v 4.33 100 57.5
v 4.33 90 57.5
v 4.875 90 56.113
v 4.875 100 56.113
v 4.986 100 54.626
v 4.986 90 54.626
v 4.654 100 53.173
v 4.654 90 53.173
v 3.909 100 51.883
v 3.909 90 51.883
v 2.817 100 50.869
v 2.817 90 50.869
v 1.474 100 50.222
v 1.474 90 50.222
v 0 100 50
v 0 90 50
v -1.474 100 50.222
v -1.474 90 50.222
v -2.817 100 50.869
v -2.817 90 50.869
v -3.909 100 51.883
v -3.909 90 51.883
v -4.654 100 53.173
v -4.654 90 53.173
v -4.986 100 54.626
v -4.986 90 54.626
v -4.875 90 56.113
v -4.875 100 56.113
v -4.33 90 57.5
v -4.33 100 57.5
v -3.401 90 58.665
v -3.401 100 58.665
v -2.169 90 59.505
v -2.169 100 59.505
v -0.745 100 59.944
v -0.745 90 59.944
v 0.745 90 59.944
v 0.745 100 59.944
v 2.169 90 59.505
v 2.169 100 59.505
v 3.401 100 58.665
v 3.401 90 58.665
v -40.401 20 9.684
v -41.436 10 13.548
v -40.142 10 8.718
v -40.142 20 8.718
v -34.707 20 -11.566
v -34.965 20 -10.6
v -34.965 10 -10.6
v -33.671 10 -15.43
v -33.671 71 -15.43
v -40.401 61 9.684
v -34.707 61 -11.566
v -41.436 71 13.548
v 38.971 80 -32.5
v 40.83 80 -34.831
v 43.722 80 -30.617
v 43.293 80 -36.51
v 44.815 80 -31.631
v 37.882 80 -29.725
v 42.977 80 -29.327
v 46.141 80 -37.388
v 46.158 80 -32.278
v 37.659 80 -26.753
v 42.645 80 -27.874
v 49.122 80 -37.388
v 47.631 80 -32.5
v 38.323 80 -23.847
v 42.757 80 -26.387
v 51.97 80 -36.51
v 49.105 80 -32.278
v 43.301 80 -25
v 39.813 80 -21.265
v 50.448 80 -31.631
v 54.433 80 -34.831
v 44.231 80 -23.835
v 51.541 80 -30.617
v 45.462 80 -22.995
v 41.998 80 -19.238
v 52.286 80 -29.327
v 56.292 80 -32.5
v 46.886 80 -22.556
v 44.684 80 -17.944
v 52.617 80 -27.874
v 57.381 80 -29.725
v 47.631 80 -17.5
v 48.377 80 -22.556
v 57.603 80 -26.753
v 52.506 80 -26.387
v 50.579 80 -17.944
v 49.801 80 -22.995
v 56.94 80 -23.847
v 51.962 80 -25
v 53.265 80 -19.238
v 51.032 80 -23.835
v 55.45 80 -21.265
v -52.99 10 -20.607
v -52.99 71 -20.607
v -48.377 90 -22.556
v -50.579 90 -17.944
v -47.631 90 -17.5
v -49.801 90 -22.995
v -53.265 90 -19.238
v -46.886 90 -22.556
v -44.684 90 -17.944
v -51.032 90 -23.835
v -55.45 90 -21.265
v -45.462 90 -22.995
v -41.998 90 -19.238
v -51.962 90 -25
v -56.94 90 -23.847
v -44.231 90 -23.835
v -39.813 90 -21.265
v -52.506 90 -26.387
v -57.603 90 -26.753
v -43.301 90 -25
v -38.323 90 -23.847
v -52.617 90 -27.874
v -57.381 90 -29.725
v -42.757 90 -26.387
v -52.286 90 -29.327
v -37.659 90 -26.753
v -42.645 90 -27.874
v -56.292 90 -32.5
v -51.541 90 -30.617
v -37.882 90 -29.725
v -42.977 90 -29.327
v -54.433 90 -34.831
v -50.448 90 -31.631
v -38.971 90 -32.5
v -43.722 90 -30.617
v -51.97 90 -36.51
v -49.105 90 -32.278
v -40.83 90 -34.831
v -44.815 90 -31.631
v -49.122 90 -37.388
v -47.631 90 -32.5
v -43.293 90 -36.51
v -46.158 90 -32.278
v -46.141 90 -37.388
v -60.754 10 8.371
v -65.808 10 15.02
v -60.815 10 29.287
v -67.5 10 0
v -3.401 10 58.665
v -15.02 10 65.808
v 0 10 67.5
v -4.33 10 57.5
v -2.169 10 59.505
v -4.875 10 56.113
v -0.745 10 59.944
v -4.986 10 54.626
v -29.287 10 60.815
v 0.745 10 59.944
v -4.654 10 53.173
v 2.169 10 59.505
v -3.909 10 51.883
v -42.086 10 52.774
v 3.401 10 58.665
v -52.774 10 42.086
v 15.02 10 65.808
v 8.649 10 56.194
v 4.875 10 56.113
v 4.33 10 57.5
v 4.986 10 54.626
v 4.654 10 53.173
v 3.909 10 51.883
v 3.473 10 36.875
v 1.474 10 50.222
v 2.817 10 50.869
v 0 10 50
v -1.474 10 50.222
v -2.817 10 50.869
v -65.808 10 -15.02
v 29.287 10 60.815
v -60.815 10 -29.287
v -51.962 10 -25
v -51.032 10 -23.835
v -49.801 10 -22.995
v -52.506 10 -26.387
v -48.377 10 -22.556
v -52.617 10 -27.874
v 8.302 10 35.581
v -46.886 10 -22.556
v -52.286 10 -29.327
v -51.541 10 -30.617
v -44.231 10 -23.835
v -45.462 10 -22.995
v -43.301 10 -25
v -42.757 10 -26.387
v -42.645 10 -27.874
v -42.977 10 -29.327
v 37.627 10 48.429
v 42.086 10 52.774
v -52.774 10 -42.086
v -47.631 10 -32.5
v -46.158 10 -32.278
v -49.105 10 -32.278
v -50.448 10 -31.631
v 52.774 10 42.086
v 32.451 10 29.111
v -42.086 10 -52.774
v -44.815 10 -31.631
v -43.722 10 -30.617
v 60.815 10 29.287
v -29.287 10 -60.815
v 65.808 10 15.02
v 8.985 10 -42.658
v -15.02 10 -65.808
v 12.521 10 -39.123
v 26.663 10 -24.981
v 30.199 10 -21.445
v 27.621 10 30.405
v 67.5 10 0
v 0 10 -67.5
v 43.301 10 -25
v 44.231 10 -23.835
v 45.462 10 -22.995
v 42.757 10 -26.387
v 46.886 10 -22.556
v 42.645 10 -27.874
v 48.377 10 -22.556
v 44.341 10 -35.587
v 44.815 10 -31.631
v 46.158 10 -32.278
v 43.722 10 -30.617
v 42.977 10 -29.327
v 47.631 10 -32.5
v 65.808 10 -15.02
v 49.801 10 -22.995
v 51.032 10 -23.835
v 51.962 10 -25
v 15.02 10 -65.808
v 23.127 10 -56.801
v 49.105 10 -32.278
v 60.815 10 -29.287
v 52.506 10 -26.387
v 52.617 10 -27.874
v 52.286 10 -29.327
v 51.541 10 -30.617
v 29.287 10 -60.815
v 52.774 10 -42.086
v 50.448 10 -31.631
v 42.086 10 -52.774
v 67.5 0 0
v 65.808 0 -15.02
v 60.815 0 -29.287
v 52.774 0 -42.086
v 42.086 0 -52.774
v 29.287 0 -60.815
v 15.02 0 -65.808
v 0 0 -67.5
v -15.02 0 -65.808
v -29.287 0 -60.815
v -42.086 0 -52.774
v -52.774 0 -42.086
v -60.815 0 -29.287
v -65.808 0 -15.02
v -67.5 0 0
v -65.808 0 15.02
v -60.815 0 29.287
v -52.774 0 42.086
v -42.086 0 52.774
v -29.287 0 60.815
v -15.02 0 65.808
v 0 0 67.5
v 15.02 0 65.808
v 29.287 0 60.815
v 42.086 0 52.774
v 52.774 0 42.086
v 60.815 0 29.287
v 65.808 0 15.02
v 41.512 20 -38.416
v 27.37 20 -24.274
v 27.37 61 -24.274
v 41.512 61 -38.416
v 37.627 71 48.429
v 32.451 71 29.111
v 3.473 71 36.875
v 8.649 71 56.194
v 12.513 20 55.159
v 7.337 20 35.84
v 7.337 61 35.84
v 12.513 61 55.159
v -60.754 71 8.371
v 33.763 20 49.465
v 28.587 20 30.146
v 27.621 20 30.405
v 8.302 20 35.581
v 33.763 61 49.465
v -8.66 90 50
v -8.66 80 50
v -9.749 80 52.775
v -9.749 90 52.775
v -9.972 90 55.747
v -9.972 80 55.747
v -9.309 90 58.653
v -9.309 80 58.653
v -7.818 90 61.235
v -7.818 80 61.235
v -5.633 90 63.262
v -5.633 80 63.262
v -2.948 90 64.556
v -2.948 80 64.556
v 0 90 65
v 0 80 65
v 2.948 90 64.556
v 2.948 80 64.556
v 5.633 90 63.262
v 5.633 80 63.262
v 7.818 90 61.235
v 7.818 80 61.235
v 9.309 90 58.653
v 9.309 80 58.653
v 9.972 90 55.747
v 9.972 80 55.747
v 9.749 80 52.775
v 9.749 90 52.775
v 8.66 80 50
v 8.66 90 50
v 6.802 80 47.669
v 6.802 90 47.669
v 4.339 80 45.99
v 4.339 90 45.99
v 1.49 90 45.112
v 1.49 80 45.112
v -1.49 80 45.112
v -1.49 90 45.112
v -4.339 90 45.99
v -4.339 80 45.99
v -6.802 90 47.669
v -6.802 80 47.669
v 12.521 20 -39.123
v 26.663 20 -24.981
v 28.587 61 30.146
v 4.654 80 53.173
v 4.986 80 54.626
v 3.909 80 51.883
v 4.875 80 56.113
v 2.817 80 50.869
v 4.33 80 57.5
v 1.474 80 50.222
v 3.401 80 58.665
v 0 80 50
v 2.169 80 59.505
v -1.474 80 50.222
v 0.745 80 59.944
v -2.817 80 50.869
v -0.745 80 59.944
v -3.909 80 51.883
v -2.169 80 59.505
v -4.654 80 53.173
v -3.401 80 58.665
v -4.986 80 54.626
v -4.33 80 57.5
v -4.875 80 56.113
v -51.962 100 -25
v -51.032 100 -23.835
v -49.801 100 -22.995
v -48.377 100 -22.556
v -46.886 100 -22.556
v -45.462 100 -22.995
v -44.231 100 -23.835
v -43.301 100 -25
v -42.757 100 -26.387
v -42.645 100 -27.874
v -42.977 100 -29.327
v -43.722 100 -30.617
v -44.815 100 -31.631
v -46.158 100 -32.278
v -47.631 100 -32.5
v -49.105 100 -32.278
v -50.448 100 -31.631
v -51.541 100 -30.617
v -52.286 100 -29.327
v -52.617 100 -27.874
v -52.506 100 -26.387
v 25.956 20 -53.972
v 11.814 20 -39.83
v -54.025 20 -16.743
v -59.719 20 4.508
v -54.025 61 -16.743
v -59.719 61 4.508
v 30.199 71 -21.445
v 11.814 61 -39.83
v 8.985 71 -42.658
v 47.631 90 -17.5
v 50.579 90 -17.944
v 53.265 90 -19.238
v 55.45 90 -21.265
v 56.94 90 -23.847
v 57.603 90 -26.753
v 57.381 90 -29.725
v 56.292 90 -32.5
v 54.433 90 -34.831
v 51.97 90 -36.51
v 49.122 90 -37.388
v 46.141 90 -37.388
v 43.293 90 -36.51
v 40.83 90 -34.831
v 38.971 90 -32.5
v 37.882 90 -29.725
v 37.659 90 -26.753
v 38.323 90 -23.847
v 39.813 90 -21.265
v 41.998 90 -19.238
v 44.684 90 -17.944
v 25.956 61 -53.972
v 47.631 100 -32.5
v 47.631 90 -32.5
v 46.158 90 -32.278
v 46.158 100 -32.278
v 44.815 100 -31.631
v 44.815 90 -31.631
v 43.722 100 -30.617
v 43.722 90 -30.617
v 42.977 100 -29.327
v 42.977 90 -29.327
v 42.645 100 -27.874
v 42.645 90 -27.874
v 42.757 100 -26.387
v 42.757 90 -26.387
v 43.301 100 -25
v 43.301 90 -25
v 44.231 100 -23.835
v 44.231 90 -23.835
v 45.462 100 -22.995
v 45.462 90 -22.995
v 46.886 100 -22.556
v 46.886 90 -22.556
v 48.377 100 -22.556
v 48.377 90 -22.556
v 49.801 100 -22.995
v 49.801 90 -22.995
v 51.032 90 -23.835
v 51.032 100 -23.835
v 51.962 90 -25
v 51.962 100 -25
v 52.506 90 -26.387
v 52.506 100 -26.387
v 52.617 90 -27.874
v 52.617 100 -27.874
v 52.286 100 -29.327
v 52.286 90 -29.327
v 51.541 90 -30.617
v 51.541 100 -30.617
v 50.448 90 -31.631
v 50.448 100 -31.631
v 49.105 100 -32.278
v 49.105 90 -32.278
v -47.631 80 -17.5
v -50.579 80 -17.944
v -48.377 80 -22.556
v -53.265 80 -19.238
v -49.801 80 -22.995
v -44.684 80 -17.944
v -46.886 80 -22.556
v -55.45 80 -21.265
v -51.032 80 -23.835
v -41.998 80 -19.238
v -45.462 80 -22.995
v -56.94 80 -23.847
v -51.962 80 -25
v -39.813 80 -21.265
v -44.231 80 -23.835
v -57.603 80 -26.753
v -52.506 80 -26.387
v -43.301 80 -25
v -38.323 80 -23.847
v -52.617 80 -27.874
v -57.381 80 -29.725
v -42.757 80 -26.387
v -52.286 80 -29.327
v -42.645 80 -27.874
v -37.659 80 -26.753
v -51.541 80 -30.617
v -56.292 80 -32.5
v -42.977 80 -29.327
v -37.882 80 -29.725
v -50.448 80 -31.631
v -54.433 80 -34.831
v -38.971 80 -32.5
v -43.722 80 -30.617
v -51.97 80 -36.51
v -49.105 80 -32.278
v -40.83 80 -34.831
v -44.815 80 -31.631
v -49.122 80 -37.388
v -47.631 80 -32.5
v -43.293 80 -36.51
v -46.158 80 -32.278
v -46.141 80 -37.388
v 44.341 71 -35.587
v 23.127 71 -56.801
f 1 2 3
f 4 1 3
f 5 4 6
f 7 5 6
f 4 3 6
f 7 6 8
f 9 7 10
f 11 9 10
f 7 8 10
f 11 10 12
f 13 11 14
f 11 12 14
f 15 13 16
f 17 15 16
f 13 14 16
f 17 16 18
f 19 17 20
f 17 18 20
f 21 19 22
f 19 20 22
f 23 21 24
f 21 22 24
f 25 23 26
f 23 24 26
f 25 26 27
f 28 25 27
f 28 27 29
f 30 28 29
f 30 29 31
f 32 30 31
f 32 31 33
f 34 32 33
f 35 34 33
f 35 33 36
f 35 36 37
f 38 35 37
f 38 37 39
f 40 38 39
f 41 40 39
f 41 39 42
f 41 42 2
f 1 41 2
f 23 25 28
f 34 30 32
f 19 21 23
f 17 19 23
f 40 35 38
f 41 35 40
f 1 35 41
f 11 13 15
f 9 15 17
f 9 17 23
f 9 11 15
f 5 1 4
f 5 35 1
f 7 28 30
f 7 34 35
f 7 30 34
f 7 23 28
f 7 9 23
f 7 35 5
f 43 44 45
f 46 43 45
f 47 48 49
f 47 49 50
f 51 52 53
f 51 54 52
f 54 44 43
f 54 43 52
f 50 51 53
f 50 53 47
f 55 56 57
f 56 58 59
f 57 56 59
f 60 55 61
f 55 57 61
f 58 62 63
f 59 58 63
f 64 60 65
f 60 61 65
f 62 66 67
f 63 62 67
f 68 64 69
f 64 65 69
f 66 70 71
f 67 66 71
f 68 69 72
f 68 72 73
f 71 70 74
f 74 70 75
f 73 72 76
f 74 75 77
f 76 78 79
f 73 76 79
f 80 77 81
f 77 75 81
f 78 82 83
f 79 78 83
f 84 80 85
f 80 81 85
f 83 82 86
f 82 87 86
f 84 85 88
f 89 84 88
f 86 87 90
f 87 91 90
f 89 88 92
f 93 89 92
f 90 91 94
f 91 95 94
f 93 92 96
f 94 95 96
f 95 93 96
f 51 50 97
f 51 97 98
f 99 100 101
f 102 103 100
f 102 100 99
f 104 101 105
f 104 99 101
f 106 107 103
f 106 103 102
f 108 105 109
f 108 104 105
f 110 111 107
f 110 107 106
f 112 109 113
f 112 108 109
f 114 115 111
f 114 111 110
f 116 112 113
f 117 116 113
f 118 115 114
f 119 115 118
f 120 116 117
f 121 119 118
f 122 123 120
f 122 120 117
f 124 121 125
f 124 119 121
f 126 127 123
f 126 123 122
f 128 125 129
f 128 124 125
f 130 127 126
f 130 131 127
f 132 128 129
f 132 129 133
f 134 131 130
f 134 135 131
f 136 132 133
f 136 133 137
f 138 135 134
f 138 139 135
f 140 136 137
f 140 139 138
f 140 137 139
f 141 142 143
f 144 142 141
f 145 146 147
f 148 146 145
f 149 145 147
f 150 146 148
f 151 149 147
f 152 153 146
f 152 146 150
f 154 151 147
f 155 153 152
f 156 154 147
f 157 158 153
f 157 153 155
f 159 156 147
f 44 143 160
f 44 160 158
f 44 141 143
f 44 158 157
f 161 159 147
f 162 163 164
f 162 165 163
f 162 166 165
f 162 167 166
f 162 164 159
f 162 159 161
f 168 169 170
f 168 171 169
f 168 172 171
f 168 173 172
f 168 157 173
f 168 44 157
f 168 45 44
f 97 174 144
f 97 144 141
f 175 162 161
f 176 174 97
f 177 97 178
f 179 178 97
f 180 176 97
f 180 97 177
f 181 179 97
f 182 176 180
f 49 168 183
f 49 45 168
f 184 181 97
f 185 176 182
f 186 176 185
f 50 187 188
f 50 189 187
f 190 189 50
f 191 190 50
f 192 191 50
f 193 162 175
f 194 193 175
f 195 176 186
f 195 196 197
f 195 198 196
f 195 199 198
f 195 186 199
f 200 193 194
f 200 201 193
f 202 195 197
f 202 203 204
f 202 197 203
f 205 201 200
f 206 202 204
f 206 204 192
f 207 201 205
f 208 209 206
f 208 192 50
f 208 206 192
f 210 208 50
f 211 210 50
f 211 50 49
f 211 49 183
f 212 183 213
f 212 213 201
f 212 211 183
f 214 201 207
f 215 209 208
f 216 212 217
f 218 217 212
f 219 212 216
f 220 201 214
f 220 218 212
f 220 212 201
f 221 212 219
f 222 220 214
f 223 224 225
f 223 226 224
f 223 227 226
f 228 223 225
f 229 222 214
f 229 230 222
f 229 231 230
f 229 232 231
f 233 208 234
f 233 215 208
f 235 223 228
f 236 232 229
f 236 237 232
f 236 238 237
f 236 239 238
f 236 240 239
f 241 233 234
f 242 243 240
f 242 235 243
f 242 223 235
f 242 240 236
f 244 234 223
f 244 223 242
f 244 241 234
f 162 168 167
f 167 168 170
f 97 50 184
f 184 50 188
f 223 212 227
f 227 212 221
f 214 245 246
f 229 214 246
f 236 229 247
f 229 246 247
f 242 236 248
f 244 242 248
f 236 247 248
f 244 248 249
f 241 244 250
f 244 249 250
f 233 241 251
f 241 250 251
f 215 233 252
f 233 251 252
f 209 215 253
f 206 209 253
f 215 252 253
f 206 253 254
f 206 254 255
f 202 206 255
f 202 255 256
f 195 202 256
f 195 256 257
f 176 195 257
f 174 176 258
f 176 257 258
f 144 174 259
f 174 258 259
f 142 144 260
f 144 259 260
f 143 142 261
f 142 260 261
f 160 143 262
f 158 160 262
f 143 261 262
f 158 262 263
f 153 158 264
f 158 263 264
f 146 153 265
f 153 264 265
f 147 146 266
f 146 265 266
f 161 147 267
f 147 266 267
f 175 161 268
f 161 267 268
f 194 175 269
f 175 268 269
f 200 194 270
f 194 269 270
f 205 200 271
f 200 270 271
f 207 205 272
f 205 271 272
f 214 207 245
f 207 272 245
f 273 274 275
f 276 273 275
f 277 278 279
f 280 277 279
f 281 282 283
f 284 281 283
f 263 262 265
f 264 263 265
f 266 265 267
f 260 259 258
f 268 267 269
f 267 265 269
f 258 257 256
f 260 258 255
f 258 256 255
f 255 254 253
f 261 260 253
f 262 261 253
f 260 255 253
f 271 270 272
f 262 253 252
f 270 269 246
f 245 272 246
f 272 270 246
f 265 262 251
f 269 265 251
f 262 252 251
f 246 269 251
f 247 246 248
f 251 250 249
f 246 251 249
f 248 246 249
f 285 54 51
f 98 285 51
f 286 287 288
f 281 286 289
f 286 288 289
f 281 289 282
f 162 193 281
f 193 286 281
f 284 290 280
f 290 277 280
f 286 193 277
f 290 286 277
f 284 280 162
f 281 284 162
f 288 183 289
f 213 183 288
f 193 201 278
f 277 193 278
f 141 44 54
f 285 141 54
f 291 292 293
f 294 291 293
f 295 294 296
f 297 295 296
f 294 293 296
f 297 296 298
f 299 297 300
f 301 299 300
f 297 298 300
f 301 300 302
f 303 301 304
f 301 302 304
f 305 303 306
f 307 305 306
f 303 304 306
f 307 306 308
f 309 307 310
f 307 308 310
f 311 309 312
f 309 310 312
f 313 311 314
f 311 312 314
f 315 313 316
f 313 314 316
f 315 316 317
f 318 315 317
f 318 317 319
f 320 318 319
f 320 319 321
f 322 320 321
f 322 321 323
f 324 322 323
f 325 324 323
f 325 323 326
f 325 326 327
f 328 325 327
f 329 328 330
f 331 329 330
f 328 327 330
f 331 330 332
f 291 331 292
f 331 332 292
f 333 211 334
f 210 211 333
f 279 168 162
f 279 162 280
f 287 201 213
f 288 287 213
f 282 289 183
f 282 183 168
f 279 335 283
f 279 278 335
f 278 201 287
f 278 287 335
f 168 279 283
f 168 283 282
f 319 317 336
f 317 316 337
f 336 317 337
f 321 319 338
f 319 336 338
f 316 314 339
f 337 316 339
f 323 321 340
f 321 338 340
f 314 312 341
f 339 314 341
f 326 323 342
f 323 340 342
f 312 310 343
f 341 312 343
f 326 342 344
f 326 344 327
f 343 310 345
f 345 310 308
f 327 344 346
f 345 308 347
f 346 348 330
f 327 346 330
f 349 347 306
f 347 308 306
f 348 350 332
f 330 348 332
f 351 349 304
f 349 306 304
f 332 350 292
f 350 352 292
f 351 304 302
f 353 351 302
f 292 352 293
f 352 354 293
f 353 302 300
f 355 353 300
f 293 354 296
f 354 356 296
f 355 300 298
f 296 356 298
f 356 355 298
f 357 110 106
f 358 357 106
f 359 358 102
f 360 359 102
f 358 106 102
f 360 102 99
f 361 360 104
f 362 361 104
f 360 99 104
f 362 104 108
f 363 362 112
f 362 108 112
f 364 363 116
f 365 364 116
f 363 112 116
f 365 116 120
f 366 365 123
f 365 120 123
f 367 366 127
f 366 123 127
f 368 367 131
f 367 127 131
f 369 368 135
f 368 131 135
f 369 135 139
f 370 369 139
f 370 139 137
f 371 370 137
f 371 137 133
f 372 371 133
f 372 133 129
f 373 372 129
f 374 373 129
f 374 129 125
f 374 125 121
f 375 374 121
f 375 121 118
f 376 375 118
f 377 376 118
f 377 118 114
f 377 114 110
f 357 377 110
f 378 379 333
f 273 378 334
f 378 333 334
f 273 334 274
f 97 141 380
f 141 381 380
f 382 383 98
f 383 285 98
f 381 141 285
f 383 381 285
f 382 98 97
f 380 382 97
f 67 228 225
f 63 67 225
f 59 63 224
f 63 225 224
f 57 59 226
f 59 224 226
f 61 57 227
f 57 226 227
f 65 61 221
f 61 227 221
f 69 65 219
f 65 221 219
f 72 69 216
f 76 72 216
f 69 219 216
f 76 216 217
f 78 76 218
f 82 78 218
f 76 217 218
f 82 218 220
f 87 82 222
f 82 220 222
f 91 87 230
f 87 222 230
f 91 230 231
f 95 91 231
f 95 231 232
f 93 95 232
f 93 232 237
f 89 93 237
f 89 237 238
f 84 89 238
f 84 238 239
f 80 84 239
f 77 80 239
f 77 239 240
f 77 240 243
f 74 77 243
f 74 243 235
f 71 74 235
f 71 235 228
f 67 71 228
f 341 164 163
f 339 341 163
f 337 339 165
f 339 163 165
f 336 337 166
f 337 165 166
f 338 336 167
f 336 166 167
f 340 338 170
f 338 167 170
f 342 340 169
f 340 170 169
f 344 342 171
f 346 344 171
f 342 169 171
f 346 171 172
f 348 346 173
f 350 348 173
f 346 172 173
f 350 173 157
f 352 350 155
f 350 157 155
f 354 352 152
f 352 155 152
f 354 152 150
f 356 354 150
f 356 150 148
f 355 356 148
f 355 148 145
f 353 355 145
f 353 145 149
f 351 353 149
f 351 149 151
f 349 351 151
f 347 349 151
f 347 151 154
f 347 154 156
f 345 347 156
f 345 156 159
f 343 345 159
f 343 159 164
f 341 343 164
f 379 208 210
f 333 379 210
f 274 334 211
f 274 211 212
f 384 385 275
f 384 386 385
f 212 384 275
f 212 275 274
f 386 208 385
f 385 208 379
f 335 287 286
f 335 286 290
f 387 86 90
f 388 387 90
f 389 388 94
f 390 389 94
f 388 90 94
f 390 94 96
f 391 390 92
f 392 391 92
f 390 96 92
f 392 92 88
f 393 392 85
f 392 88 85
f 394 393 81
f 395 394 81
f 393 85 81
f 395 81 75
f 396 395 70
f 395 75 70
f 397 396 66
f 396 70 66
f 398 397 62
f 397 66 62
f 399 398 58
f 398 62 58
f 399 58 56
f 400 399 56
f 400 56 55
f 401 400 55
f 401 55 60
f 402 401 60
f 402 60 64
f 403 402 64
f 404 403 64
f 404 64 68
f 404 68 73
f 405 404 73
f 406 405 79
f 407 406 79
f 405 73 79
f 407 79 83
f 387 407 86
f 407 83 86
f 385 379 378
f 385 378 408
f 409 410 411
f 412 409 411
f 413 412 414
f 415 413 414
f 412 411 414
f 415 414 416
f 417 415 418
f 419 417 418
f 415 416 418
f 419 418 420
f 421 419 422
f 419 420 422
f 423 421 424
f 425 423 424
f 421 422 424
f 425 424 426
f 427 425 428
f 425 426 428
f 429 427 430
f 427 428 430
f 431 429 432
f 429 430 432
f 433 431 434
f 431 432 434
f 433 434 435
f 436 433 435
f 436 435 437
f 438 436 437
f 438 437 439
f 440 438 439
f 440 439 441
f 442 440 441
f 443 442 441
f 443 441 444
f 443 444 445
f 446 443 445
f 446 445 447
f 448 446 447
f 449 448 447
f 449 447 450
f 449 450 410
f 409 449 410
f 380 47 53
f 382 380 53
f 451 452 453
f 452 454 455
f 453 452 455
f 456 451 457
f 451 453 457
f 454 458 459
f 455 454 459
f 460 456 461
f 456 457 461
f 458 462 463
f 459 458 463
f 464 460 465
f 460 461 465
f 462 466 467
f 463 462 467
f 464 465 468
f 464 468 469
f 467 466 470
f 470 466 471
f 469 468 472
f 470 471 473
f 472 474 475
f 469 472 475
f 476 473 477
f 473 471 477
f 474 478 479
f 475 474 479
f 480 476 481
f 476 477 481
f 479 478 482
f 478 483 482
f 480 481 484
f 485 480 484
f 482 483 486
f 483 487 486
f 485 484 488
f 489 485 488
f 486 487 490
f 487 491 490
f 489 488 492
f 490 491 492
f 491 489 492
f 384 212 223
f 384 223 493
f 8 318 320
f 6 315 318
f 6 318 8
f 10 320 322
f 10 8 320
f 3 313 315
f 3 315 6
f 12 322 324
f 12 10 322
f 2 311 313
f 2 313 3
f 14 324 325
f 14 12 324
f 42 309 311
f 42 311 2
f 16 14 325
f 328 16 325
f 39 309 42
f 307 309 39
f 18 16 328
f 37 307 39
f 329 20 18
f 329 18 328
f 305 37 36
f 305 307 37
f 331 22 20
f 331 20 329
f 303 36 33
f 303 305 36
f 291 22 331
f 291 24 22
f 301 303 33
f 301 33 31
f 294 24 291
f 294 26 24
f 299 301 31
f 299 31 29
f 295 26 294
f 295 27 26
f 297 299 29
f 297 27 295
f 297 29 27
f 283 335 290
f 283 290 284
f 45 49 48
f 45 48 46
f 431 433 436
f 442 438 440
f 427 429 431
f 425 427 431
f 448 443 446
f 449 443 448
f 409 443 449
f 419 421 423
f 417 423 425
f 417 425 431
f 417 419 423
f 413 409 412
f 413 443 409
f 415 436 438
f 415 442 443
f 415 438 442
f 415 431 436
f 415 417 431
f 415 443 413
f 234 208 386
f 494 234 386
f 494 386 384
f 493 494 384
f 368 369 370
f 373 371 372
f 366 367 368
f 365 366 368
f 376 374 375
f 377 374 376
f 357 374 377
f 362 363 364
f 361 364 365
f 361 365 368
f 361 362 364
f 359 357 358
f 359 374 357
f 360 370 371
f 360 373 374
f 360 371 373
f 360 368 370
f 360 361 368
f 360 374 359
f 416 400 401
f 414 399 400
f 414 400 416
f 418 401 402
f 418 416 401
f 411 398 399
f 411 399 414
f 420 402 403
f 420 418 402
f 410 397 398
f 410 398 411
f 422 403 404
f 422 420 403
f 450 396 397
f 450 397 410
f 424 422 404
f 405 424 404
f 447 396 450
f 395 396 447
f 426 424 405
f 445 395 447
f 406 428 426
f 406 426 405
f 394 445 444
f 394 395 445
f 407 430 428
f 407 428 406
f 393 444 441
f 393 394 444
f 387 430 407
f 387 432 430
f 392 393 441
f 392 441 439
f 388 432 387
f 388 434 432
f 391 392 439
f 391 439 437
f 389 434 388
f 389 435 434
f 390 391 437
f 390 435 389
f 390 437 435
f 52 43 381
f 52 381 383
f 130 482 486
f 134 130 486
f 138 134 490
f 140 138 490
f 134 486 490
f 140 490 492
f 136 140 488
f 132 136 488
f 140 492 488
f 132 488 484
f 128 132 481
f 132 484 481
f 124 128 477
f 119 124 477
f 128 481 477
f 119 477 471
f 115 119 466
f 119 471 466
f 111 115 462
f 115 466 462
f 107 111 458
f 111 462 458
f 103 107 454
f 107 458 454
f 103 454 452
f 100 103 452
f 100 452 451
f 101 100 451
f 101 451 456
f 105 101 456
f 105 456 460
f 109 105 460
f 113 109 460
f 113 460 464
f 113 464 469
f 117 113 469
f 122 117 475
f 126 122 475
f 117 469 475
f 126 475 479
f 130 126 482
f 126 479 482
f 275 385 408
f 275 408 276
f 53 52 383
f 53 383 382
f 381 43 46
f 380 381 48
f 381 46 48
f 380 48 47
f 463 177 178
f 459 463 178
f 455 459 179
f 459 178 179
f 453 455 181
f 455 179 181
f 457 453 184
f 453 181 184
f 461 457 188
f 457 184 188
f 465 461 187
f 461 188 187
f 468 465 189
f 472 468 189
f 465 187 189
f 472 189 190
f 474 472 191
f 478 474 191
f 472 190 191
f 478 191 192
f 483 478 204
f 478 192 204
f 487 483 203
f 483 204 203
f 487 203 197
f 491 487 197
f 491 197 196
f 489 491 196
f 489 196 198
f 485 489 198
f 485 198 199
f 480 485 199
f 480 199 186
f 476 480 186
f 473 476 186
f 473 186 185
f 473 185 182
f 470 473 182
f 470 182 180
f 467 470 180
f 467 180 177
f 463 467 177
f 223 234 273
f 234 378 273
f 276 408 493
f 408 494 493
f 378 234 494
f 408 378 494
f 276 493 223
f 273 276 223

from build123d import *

# Parameters (mm, degrees)
BOSS_EXTRUDE1_OUTLINE_R = 67.5
BOSS_EXTRUDE1_DEPTH     = 10
SKETCH4_R               = 5
BOSS_EXTRUDE2_DEPTH     = 90
BOSS_EXTRUDE3_START     = 70
SKETCH4_3_R             = 10
SKETCH4_3_R_2           = 5
BOSS_EXTRUDE3_DEPTH     = 10
BOSS_EXTRUDE4_DEPTH     = 50
SKETCH6_W               = 30
SKETCH6_H               = 61
SKETCH6_W_2             = 22
SKETCH6_H_2             = 41
BOSS_EXTRUDE5_DEPTH     = 20
SKETCH6_7_W             = 22
SKETCH6_7_H             = 41
BOSS_EXTRUDE6_DEPTH     = 20
SKETCH6_3_W             = 22
SKETCH6_3_H             = 41
CUT_EXTRUDE1_DEPTH      = 166.583644089
CIRPATTERN1_COUNT       = 3


# Read off the part's stored shape, not the designer's step: Boss-Extrude1
with BuildPart() as part:
    # Boss-Extrude1 outline → Boss-Extrude1 (new body)
    with BuildSketch(Plane(origin=(0, 0, 0), x_dir=(1, 0, 0), z_dir=(0, 1, 0))):
        Circle(BOSS_EXTRUDE1_OUTLINE_R)
    extrude(amount=BOSS_EXTRUDE1_DEPTH)

    # Sketch4 → Boss-Extrude2 (add)
    with BuildSketch(Plane(origin=(0, 10, 0), x_dir=(1, 0, 0), z_dir=(0, 1, 0))):
        with Locations(Location((47.631397208, 27.5, 0), (0, 0, 90))):
            Circle(SKETCH4_R)
    boss_extrude2 = extrude(amount=BOSS_EXTRUDE2_DEPTH)

    # Sketch4<3> → Boss-Extrude3 (add)
    with BuildSketch(Plane(origin=(0, 10, 0), x_dir=(1, 0, 0), z_dir=(0, 1, 0)).offset(BOSS_EXTRUDE3_START)):
        with Locations(Location((47.631397208, 27.5, 0), (0, 0, 270))):
            Circle(SKETCH4_3_R)
        with Locations(Location((47.631397208, 27.5, 0), (0, 0, 90))):
            Circle(SKETCH4_3_R_2, mode=Mode.SUBTRACT)
    boss_extrude3 = extrude(amount=BOSS_EXTRUDE3_DEPTH)

    # Sketch5 → Boss-Extrude4 (add)
    with BuildSketch(Plane(origin=(0, 10, 0), x_dir=(1, 0, 0), z_dir=(0, 1, 0))):
        Polygon((12.520884891, 39.12285698), (16.056418797, 42.658390886), (30.19855442, 28.516255262), (26.663020514, 24.980721356), align=None)
    boss_extrude4 = extrude(amount=BOSS_EXTRUDE4_DEPTH)

    # Sketch6 → Boss-Extrude5 (add)
    with BuildSketch(Plane(origin=(25.821870935, 0, -25.821870935), x_dir=(0.7071067811865516, 0, 0.7071067811865435), z_dir=(-0.7071067811865435, 0, 0.7071067811865516))):
        with Locations((-8.810434857, 40.5)):
            Rectangle(SKETCH6_W, SKETCH6_H)
        with Locations((-8.810434857, 40.5)):
            Rectangle(SKETCH6_W_2, SKETCH6_H_2, mode=Mode.SUBTRACT)
    boss_extrude5 = extrude(amount=-BOSS_EXTRUDE5_DEPTH)

    # Sketch6<7> → Boss-Extrude6 (add)
    with BuildSketch(Plane(origin=(25.821870935, 0, -25.821870935), x_dir=(0.7071067811865516, 0, 0.7071067811865435), z_dir=(-0.7071067811865435, 0, 0.7071067811865516))):
        with Locations((-8.810434857, 40.5)):
            Rectangle(SKETCH6_7_W, SKETCH6_7_H)
    extrude(amount=-BOSS_EXTRUDE6_DEPTH)

    # Sketch6<3> → Cut-Extrude1 (cut, through all)
    with BuildSketch(Plane(origin=(25.821870935, 0, -25.821870935), x_dir=(0.7071067811865516, 0, 0.7071067811865435), z_dir=(-0.7071067811865435, 0, 0.7071067811865516))):
        with Locations((-8.810434857, 40.5)):
            Rectangle(SKETCH6_3_W, SKETCH6_3_H)
    cut_extrude1 = extrude(amount=-CUT_EXTRUDE1_DEPTH, mode=Mode.SUBTRACT)

    # CirPattern1: Boss-Extrude2, Boss-Extrude3, Boss-Extrude4, Boss-Extrude5, Cut-Extrude1 ×3 about axis
    cirpattern1_axis = Axis((0, 0, 0), (0, 1, 0))
    add([boss_extrude2.rotate(cirpattern1_axis, i * 360 / CIRPATTERN1_COUNT) for i in range(1, CIRPATTERN1_COUNT)])
    add([boss_extrude3.rotate(cirpattern1_axis, i * 360 / CIRPATTERN1_COUNT) for i in range(1, CIRPATTERN1_COUNT)])
    add([boss_extrude4.rotate(cirpattern1_axis, i * 360 / CIRPATTERN1_COUNT) for i in range(1, CIRPATTERN1_COUNT)])
    add([boss_extrude5.rotate(cirpattern1_axis, i * 360 / CIRPATTERN1_COUNT) for i in range(1, CIRPATTERN1_COUNT)])
    add([cut_extrude1.rotate(cirpattern1_axis, i * 360 / CIRPATTERN1_COUNT) for i in range(1, CIRPATTERN1_COUNT)], mode=Mode.SUBTRACT)


solid = part.part
